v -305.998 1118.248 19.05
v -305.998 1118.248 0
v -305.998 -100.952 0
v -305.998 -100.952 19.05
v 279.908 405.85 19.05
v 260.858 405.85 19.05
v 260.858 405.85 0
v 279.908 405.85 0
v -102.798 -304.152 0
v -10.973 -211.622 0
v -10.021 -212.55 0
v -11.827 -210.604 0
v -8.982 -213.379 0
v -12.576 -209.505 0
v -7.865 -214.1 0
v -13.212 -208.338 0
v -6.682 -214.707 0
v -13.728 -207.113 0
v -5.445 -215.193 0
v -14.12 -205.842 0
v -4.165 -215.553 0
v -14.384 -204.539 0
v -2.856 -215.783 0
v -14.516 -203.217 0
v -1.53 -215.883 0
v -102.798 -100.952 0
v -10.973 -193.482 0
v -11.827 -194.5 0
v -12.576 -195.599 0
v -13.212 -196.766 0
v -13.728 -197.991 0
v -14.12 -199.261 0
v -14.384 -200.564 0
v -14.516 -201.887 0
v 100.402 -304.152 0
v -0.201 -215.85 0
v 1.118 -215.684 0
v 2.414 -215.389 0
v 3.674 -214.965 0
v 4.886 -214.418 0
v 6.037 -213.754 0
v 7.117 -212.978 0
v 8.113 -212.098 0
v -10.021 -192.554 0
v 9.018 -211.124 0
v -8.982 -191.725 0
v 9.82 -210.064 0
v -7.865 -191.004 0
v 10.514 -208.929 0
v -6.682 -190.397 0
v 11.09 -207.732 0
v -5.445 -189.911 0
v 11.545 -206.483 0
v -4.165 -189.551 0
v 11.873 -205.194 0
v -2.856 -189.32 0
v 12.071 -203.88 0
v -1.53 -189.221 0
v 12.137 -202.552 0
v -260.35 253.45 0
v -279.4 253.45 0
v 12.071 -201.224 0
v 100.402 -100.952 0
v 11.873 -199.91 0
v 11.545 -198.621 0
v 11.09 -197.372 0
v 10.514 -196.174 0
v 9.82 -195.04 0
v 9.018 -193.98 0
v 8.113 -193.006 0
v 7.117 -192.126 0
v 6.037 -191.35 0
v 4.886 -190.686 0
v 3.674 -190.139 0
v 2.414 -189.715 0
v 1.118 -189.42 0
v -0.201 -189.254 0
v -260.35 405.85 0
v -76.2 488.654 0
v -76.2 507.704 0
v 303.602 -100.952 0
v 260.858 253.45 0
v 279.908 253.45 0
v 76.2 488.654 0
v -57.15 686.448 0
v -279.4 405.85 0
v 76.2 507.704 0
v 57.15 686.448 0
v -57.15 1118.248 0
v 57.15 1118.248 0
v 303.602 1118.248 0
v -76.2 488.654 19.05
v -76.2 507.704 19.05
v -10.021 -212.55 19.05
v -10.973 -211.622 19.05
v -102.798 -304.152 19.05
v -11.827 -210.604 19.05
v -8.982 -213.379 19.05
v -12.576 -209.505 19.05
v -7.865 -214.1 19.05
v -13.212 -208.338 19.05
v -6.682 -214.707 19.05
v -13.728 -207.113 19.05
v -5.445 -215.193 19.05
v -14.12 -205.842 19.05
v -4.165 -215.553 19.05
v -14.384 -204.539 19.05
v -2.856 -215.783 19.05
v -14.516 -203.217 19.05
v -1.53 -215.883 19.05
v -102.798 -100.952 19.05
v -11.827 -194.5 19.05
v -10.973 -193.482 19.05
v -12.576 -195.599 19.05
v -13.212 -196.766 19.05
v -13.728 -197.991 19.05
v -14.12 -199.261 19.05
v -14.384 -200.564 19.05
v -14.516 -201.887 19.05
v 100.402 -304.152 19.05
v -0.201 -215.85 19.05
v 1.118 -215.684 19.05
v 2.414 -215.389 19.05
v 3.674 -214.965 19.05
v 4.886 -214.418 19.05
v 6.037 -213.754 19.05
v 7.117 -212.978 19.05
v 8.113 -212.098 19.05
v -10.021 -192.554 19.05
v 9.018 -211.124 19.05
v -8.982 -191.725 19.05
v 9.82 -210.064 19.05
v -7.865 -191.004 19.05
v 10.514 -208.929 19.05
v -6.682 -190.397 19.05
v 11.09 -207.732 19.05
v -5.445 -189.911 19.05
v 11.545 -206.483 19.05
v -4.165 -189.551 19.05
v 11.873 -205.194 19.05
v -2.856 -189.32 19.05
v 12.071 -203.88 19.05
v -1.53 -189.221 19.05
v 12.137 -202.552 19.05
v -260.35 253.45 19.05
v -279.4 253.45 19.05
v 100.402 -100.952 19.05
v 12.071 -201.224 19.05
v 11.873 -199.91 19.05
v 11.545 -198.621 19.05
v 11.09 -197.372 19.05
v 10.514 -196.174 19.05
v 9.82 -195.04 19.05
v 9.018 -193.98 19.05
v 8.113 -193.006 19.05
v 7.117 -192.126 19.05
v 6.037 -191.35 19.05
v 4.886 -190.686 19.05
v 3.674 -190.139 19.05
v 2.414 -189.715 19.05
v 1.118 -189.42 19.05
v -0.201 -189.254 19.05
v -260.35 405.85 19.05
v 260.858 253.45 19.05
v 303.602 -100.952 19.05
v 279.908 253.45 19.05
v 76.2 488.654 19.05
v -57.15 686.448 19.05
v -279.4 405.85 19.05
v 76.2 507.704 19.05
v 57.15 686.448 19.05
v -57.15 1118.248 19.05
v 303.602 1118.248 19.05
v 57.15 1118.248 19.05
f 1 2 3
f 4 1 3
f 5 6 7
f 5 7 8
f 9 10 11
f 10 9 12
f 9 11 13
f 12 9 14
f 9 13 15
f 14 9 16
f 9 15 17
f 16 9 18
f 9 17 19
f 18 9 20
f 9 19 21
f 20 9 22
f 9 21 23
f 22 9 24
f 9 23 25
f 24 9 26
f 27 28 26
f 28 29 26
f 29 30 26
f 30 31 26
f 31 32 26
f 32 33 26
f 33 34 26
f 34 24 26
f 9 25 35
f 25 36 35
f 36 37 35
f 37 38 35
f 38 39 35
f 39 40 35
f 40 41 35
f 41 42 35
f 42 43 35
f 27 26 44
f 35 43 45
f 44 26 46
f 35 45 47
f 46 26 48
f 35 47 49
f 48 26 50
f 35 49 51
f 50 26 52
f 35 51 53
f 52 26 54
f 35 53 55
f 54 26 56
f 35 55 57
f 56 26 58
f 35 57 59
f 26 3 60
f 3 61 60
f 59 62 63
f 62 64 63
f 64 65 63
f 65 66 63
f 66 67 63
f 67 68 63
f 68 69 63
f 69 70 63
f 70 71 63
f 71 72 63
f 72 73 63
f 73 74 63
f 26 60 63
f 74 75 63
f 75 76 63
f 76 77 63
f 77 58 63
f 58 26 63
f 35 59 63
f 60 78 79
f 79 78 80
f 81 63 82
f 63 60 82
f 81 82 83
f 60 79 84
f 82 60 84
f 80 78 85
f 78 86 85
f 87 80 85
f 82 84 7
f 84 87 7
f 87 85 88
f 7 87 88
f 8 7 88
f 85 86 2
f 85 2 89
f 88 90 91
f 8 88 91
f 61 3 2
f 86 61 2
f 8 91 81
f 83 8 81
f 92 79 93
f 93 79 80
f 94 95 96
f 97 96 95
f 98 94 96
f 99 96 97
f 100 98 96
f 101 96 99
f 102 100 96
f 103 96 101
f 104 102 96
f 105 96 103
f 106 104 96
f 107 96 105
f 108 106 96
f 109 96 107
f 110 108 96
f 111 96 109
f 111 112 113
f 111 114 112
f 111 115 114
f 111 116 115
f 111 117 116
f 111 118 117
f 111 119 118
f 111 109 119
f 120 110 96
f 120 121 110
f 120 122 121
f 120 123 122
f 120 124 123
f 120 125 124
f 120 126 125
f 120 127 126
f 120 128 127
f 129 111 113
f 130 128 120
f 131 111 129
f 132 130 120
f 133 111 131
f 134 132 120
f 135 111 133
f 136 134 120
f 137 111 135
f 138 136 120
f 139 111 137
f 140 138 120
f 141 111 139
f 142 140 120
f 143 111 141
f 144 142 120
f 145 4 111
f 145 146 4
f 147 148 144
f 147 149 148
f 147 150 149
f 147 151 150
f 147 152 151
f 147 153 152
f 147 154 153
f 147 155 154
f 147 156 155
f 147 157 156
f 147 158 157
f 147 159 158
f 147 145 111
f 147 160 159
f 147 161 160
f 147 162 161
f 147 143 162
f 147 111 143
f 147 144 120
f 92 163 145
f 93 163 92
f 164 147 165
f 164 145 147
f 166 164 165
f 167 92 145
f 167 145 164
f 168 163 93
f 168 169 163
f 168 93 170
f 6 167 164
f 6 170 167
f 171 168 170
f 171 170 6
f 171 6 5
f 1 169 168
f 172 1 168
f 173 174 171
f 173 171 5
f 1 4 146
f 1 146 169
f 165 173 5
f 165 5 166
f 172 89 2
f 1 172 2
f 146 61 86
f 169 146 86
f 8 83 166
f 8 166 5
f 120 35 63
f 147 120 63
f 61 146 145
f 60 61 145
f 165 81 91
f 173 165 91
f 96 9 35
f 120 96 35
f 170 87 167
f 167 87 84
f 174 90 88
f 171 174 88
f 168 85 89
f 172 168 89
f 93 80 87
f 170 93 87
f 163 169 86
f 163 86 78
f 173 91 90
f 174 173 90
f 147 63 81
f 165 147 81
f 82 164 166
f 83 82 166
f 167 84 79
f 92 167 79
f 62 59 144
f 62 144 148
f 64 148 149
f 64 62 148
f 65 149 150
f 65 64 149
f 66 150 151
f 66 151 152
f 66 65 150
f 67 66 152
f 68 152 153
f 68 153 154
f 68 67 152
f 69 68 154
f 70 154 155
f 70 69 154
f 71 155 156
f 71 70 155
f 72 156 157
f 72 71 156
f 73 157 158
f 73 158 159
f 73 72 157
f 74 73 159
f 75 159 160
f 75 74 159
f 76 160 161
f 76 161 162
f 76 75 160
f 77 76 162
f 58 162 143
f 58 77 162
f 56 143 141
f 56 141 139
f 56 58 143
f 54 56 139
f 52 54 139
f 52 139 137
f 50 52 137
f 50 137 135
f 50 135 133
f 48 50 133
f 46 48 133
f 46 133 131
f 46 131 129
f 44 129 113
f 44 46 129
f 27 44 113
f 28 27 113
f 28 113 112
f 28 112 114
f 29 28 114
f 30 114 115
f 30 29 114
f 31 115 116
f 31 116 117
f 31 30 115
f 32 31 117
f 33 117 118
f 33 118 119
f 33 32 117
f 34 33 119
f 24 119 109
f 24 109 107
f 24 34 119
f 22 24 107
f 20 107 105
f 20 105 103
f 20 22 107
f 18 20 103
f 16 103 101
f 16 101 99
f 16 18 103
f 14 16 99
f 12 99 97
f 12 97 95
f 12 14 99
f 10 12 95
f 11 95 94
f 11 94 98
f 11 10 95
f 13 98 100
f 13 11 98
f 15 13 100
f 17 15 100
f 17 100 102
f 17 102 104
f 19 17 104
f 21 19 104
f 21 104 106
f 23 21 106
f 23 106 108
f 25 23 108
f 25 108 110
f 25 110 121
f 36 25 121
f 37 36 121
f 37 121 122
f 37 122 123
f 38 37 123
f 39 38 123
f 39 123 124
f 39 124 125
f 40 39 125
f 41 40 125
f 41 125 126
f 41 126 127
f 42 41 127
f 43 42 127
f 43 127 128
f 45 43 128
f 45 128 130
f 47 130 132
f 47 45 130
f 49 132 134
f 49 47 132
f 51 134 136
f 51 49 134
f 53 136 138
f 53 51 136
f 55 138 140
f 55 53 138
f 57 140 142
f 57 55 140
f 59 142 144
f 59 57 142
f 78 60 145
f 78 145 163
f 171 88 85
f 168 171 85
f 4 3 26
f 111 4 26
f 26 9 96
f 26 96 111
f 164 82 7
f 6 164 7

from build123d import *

# Parameters (mm, degrees)
F0_W     = 19.05
F0_H     = 152.4
F0_W_2   = 203.2
F0_H_2   = 203.2
F0_R     = 13.335
F1_DEPTH = 19.05


with BuildPart() as f1:
    # F0 (on Top) → F1 (new body)
    with BuildSketch(Plane.XY):
        Polygon((-305.997565, 1118.248048), (-305.997565, -100.951952), (-102.797565, -100.951952), (100.402435, -100.951952), (303.602435, -100.951952), (303.602435, 1118.248048), (57.15, 1118.248048), (57.15, 686.448048), (-57.15, 686.448048), (-57.15, 1118.248048), align=None)
        with Locations((-269.875, 329.650346)):
            Rectangle(F0_W, F0_H, mode=Mode.SUBTRACT)
        with Locations((270.383059, 329.650346)):
            Rectangle(F0_W, F0_H, mode=Mode.SUBTRACT)
        Polygon((76.2, 507.704346), (76.2, 498.179346), (76.2, 488.654346), (-76.2, 488.654346), (-76.2, 498.179346), (-76.2, 507.704346), align=None, mode=Mode.SUBTRACT)
        with Locations((-1.197565, -202.551952)):
            Rectangle(F0_W_2, F0_H_2)
        with Locations((-1.197565, -202.551952)):
            Circle(F0_R, mode=Mode.SUBTRACT)
    extrude(amount=F1_DEPTH)


solid = f1.part
